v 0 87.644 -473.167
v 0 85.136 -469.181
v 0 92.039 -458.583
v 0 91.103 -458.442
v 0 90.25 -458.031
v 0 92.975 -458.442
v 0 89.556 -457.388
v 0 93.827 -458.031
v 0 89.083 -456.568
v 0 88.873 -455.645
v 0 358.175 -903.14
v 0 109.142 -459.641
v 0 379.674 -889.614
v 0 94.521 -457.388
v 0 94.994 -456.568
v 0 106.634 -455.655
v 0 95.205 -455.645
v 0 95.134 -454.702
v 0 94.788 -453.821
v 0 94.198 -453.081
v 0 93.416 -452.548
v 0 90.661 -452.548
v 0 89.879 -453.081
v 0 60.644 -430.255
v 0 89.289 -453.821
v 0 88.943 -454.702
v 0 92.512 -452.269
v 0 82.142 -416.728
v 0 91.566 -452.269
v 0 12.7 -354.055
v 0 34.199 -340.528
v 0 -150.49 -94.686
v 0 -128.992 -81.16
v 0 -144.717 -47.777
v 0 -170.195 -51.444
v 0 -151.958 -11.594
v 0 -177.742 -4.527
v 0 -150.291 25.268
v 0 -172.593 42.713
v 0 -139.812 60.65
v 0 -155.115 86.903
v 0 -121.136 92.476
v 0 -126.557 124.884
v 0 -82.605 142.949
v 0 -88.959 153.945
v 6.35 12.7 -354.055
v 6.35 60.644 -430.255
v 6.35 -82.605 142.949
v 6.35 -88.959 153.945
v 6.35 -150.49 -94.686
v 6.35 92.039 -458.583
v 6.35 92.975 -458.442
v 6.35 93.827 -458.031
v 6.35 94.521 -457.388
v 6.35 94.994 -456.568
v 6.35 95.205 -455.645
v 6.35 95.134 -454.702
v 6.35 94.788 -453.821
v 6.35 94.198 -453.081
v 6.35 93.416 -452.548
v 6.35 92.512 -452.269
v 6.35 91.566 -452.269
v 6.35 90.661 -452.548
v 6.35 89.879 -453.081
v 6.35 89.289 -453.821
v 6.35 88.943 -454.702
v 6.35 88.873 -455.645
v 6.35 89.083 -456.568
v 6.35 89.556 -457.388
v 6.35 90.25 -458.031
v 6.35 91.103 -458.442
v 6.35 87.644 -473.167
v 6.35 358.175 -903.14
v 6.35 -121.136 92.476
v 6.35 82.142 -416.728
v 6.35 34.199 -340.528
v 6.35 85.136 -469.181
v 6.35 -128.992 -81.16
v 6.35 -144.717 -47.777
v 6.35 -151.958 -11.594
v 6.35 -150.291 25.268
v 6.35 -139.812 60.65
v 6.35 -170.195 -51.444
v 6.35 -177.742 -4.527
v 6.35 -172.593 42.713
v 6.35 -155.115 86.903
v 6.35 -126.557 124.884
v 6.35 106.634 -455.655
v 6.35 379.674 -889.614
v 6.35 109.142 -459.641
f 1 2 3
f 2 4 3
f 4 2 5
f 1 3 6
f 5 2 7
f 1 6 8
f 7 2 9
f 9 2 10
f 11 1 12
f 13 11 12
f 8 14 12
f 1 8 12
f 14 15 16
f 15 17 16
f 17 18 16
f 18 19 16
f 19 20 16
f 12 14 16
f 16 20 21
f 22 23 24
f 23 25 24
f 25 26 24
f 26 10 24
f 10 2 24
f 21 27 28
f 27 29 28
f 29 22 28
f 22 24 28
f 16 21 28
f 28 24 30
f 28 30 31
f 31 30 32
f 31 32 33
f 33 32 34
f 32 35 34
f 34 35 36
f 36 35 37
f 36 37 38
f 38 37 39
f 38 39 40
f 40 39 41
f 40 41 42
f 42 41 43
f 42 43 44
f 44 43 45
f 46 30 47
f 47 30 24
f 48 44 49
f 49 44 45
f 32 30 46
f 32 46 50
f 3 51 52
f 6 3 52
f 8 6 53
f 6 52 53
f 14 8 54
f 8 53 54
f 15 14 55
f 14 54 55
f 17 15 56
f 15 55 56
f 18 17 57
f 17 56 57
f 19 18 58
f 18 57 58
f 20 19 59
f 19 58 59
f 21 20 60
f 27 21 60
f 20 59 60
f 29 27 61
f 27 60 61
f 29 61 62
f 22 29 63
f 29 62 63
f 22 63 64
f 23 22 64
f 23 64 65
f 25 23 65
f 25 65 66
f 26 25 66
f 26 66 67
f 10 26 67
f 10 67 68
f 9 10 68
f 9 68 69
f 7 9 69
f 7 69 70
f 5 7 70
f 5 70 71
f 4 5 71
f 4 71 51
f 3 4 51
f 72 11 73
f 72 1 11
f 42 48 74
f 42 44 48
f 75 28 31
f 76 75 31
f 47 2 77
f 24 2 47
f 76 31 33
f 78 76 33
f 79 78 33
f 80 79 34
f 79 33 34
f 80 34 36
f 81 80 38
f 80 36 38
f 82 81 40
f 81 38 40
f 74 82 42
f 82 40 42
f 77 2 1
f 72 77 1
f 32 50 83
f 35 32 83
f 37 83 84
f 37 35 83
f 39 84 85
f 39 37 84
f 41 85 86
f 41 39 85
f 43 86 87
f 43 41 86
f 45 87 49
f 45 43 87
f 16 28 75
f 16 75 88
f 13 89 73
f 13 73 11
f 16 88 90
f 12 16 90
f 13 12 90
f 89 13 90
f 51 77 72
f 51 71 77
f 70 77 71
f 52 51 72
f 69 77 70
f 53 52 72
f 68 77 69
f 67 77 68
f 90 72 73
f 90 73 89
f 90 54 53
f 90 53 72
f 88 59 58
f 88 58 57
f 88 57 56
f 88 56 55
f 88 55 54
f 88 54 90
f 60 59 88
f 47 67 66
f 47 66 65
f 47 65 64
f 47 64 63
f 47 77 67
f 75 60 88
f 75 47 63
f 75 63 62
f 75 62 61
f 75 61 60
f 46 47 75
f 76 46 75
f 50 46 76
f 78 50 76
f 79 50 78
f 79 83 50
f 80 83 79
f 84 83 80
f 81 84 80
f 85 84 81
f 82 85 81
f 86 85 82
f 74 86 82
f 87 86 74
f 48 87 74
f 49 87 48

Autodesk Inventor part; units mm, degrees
ref_plane "YZ Plane" through (0, 0, 0) normal (1, 0, 0) x (0, 1, 0)
ref_plane "XZ Plane" through (0, 0, 0) normal (0, 1, 0) x (-1, 0, 0)
ref_plane "XY Plane" through (0, 0, 0) normal (0, 0, 1) x (1, 0, 0)
sketch "Sketch1" plane through (0, 0, 0) normal (1, 0, 0) x (0, 1, 0)
  circle A0 centre (0, 0) radius 152.4
  line L0 (-76.2507, 131.953) -> (76.2507, 131.953)
  line L1 (76.2507, 131.953) -> (76.2507, -131.953)
  line L2 (76.2507, -131.953) -> (-76.2507, -131.953)
  line L3 (-76.2507, -131.953) -> (-76.2507, 131.953)
  line L4 (-76.2507, 131.953) -> (76.2507, -131.953) construction
  line L5 (76.2507, 131.953) -> (-76.2507, -131.953) construction
  line L6 (-76.2507, 131.953) -> (-88.9591, 153.9452)
  line L7 (-76.2507, -131.953) -> (-88.9591, -153.9452)
  arc A1 (-88.9591, 153.9452) -> (-88.9591, -153.9452) centre (0, 0) ccw
  line L8 (-88.9591, 153.9452) -> (-177.8, 153.9452)
  line L9 (-177.8, 153.9452) -> (-177.8, -354.0548)
  line L10 (-177.8, -354.0548) -> (0, -354.0548)
  line L11 (0, -354.0548) -> (0, -430.2548)
  line L12 (0, -430.2548) -> (-127, -430.2548)
  line L13 (-127, -430.2548) -> (-127, -354.0548)
  line L14 (-127, -430.2548) -> (-177.8, -430.2548)
  line L15 (-177.8, -430.2548) -> (-177.8, -354.0548)
  line L16 (0, -354.0548) -> (12.7, -354.0548)
  line L17 (12.7, -354.0548) -> (-150.4905, -94.6861)
  line L18 (12.7, -354.0548) -> (34.1986, -340.5282)
  line L19 (34.1986, -340.5282) -> (-128.9918, -81.1595)
  line L20 (12.7, -354.0548) -> (60.6438, -430.2548)
  line L21 (60.6438, -430.2548) -> (82.1424, -416.7282)
  line L22 (82.1424, -416.7282) -> (34.1986, -340.5282)
  line L23 (-177.8, 0) -> (127, 0)
  circle A2 centre (127, 0) radius 304.8
  line L24 (-82.6049, 142.9491) -> (-121.1364, 92.4756)
  line L25 (0, -430.2548) -> (0, -455.6548)
  line L26 (0, -455.6548) -> (235.9429, -455.6548)
  line L27 (82.1424, -416.7282) -> (106.6344, -455.6548)
  line L28 (106.6344, -455.6548) -> (85.1357, -469.1814)
  line L29 (85.1357, -469.1814) -> (60.6438, -430.2548)
  line L30 (95.885, -462.4181) -> (91.6297, -455.6548)
  line L31 (91.6297, -455.6548) -> (98.393, -466.4042)
  line L32 (98.393, -466.4042) -> (120.7006, -452.3686)
  line L33 (106.6344, -455.6548) -> (109.1423, -459.6409)
  line L34 (98.393, -466.4042) -> (67.8539, -485.6188)
  line L35 (85.1357, -469.1814) -> (87.6437, -473.1674)
  line L36 (109.1423, -459.6409) -> (87.6437, -473.1674)
  arc A3 (-88.9591, 153.9452) -> (-150.4905, -94.6861) centre (0, 0) ccw
  line L37 (-128.9918, -81.1595) -> (109.1423, -459.6409)
  line L38 (-150.4905, -94.6861) -> (87.6437, -473.1674)
  line L39 (87.6437, -473.1674) -> (109.1423, -459.6409)
  dimension "d5" = 304.8
  dimension "d6" = 263.906
  dimension "d7" = 25.4
  dimension "d8" = 25.4
  dimension "d9" = 508
  dimension "d10" = 76.2
  dimension "d11" = 127
  dimension "d12" = 12.7
  dimension "d13" = 25.4
  dimension "d14" = 25.4
  dimension "d15" = 304.8
  dimension "d16" = 25.4
  dimension "d17" = 12.7
extrude "Extrusion1" add sketch "Sketch1" along normal blind 6.35 contours A0 L23 A1 L6 L24 | L19 L7 A1 L23 A0 | L19 A2 L17 A1 L7 | L19 L18 L17 A2 | L22 L21 L20 L18 | L27 L26 L29 L21 | L28 L30 L26 | L33 L32 L31 L28 | L26 L30 L28 L29 | L31 L34 L35 L28
sketch "Sketch2" plane through (6.35, 0, 0) normal (1, 0, 0) x (0, 0, -1)
  line L0 (473.1674, 87.6437) -> (459.6409, 109.1423) projected
  line L1 (-142.9491, -82.6049) -> (-153.9452, -88.9591) projected
  line L2 (466.4042, 98.393) -> (455.4081, 92.0388)
  circle A0 centre (455.4081, 92.0388) radius 3.175
  dimension "d20" = 12.7
  dimension "d21" = 6.35
extrude "Extrusion2" cut sketch "Sketch2" against normal blind 25.4
sketch "Sketch3" plane through (6.35, 109.1423, -459.6409) normal (0, 0.5325427, -0.8464031) x (-1, 0, 0)
  line L0 (6.35, -25.4) -> (6.35, 0) projected
  line L1 (6.35, 0) -> (0, 0) projected
  line L2 (0, -25.4) -> (0, 0) projected
  line L3 (6.35, -25.4) -> (0, -25.4) projected
  point P0 (6.35, 152.4)
extrude "Extrusion3" add sketch "Sketch3" along normal blind 508
properties part number "MammothTusk"
